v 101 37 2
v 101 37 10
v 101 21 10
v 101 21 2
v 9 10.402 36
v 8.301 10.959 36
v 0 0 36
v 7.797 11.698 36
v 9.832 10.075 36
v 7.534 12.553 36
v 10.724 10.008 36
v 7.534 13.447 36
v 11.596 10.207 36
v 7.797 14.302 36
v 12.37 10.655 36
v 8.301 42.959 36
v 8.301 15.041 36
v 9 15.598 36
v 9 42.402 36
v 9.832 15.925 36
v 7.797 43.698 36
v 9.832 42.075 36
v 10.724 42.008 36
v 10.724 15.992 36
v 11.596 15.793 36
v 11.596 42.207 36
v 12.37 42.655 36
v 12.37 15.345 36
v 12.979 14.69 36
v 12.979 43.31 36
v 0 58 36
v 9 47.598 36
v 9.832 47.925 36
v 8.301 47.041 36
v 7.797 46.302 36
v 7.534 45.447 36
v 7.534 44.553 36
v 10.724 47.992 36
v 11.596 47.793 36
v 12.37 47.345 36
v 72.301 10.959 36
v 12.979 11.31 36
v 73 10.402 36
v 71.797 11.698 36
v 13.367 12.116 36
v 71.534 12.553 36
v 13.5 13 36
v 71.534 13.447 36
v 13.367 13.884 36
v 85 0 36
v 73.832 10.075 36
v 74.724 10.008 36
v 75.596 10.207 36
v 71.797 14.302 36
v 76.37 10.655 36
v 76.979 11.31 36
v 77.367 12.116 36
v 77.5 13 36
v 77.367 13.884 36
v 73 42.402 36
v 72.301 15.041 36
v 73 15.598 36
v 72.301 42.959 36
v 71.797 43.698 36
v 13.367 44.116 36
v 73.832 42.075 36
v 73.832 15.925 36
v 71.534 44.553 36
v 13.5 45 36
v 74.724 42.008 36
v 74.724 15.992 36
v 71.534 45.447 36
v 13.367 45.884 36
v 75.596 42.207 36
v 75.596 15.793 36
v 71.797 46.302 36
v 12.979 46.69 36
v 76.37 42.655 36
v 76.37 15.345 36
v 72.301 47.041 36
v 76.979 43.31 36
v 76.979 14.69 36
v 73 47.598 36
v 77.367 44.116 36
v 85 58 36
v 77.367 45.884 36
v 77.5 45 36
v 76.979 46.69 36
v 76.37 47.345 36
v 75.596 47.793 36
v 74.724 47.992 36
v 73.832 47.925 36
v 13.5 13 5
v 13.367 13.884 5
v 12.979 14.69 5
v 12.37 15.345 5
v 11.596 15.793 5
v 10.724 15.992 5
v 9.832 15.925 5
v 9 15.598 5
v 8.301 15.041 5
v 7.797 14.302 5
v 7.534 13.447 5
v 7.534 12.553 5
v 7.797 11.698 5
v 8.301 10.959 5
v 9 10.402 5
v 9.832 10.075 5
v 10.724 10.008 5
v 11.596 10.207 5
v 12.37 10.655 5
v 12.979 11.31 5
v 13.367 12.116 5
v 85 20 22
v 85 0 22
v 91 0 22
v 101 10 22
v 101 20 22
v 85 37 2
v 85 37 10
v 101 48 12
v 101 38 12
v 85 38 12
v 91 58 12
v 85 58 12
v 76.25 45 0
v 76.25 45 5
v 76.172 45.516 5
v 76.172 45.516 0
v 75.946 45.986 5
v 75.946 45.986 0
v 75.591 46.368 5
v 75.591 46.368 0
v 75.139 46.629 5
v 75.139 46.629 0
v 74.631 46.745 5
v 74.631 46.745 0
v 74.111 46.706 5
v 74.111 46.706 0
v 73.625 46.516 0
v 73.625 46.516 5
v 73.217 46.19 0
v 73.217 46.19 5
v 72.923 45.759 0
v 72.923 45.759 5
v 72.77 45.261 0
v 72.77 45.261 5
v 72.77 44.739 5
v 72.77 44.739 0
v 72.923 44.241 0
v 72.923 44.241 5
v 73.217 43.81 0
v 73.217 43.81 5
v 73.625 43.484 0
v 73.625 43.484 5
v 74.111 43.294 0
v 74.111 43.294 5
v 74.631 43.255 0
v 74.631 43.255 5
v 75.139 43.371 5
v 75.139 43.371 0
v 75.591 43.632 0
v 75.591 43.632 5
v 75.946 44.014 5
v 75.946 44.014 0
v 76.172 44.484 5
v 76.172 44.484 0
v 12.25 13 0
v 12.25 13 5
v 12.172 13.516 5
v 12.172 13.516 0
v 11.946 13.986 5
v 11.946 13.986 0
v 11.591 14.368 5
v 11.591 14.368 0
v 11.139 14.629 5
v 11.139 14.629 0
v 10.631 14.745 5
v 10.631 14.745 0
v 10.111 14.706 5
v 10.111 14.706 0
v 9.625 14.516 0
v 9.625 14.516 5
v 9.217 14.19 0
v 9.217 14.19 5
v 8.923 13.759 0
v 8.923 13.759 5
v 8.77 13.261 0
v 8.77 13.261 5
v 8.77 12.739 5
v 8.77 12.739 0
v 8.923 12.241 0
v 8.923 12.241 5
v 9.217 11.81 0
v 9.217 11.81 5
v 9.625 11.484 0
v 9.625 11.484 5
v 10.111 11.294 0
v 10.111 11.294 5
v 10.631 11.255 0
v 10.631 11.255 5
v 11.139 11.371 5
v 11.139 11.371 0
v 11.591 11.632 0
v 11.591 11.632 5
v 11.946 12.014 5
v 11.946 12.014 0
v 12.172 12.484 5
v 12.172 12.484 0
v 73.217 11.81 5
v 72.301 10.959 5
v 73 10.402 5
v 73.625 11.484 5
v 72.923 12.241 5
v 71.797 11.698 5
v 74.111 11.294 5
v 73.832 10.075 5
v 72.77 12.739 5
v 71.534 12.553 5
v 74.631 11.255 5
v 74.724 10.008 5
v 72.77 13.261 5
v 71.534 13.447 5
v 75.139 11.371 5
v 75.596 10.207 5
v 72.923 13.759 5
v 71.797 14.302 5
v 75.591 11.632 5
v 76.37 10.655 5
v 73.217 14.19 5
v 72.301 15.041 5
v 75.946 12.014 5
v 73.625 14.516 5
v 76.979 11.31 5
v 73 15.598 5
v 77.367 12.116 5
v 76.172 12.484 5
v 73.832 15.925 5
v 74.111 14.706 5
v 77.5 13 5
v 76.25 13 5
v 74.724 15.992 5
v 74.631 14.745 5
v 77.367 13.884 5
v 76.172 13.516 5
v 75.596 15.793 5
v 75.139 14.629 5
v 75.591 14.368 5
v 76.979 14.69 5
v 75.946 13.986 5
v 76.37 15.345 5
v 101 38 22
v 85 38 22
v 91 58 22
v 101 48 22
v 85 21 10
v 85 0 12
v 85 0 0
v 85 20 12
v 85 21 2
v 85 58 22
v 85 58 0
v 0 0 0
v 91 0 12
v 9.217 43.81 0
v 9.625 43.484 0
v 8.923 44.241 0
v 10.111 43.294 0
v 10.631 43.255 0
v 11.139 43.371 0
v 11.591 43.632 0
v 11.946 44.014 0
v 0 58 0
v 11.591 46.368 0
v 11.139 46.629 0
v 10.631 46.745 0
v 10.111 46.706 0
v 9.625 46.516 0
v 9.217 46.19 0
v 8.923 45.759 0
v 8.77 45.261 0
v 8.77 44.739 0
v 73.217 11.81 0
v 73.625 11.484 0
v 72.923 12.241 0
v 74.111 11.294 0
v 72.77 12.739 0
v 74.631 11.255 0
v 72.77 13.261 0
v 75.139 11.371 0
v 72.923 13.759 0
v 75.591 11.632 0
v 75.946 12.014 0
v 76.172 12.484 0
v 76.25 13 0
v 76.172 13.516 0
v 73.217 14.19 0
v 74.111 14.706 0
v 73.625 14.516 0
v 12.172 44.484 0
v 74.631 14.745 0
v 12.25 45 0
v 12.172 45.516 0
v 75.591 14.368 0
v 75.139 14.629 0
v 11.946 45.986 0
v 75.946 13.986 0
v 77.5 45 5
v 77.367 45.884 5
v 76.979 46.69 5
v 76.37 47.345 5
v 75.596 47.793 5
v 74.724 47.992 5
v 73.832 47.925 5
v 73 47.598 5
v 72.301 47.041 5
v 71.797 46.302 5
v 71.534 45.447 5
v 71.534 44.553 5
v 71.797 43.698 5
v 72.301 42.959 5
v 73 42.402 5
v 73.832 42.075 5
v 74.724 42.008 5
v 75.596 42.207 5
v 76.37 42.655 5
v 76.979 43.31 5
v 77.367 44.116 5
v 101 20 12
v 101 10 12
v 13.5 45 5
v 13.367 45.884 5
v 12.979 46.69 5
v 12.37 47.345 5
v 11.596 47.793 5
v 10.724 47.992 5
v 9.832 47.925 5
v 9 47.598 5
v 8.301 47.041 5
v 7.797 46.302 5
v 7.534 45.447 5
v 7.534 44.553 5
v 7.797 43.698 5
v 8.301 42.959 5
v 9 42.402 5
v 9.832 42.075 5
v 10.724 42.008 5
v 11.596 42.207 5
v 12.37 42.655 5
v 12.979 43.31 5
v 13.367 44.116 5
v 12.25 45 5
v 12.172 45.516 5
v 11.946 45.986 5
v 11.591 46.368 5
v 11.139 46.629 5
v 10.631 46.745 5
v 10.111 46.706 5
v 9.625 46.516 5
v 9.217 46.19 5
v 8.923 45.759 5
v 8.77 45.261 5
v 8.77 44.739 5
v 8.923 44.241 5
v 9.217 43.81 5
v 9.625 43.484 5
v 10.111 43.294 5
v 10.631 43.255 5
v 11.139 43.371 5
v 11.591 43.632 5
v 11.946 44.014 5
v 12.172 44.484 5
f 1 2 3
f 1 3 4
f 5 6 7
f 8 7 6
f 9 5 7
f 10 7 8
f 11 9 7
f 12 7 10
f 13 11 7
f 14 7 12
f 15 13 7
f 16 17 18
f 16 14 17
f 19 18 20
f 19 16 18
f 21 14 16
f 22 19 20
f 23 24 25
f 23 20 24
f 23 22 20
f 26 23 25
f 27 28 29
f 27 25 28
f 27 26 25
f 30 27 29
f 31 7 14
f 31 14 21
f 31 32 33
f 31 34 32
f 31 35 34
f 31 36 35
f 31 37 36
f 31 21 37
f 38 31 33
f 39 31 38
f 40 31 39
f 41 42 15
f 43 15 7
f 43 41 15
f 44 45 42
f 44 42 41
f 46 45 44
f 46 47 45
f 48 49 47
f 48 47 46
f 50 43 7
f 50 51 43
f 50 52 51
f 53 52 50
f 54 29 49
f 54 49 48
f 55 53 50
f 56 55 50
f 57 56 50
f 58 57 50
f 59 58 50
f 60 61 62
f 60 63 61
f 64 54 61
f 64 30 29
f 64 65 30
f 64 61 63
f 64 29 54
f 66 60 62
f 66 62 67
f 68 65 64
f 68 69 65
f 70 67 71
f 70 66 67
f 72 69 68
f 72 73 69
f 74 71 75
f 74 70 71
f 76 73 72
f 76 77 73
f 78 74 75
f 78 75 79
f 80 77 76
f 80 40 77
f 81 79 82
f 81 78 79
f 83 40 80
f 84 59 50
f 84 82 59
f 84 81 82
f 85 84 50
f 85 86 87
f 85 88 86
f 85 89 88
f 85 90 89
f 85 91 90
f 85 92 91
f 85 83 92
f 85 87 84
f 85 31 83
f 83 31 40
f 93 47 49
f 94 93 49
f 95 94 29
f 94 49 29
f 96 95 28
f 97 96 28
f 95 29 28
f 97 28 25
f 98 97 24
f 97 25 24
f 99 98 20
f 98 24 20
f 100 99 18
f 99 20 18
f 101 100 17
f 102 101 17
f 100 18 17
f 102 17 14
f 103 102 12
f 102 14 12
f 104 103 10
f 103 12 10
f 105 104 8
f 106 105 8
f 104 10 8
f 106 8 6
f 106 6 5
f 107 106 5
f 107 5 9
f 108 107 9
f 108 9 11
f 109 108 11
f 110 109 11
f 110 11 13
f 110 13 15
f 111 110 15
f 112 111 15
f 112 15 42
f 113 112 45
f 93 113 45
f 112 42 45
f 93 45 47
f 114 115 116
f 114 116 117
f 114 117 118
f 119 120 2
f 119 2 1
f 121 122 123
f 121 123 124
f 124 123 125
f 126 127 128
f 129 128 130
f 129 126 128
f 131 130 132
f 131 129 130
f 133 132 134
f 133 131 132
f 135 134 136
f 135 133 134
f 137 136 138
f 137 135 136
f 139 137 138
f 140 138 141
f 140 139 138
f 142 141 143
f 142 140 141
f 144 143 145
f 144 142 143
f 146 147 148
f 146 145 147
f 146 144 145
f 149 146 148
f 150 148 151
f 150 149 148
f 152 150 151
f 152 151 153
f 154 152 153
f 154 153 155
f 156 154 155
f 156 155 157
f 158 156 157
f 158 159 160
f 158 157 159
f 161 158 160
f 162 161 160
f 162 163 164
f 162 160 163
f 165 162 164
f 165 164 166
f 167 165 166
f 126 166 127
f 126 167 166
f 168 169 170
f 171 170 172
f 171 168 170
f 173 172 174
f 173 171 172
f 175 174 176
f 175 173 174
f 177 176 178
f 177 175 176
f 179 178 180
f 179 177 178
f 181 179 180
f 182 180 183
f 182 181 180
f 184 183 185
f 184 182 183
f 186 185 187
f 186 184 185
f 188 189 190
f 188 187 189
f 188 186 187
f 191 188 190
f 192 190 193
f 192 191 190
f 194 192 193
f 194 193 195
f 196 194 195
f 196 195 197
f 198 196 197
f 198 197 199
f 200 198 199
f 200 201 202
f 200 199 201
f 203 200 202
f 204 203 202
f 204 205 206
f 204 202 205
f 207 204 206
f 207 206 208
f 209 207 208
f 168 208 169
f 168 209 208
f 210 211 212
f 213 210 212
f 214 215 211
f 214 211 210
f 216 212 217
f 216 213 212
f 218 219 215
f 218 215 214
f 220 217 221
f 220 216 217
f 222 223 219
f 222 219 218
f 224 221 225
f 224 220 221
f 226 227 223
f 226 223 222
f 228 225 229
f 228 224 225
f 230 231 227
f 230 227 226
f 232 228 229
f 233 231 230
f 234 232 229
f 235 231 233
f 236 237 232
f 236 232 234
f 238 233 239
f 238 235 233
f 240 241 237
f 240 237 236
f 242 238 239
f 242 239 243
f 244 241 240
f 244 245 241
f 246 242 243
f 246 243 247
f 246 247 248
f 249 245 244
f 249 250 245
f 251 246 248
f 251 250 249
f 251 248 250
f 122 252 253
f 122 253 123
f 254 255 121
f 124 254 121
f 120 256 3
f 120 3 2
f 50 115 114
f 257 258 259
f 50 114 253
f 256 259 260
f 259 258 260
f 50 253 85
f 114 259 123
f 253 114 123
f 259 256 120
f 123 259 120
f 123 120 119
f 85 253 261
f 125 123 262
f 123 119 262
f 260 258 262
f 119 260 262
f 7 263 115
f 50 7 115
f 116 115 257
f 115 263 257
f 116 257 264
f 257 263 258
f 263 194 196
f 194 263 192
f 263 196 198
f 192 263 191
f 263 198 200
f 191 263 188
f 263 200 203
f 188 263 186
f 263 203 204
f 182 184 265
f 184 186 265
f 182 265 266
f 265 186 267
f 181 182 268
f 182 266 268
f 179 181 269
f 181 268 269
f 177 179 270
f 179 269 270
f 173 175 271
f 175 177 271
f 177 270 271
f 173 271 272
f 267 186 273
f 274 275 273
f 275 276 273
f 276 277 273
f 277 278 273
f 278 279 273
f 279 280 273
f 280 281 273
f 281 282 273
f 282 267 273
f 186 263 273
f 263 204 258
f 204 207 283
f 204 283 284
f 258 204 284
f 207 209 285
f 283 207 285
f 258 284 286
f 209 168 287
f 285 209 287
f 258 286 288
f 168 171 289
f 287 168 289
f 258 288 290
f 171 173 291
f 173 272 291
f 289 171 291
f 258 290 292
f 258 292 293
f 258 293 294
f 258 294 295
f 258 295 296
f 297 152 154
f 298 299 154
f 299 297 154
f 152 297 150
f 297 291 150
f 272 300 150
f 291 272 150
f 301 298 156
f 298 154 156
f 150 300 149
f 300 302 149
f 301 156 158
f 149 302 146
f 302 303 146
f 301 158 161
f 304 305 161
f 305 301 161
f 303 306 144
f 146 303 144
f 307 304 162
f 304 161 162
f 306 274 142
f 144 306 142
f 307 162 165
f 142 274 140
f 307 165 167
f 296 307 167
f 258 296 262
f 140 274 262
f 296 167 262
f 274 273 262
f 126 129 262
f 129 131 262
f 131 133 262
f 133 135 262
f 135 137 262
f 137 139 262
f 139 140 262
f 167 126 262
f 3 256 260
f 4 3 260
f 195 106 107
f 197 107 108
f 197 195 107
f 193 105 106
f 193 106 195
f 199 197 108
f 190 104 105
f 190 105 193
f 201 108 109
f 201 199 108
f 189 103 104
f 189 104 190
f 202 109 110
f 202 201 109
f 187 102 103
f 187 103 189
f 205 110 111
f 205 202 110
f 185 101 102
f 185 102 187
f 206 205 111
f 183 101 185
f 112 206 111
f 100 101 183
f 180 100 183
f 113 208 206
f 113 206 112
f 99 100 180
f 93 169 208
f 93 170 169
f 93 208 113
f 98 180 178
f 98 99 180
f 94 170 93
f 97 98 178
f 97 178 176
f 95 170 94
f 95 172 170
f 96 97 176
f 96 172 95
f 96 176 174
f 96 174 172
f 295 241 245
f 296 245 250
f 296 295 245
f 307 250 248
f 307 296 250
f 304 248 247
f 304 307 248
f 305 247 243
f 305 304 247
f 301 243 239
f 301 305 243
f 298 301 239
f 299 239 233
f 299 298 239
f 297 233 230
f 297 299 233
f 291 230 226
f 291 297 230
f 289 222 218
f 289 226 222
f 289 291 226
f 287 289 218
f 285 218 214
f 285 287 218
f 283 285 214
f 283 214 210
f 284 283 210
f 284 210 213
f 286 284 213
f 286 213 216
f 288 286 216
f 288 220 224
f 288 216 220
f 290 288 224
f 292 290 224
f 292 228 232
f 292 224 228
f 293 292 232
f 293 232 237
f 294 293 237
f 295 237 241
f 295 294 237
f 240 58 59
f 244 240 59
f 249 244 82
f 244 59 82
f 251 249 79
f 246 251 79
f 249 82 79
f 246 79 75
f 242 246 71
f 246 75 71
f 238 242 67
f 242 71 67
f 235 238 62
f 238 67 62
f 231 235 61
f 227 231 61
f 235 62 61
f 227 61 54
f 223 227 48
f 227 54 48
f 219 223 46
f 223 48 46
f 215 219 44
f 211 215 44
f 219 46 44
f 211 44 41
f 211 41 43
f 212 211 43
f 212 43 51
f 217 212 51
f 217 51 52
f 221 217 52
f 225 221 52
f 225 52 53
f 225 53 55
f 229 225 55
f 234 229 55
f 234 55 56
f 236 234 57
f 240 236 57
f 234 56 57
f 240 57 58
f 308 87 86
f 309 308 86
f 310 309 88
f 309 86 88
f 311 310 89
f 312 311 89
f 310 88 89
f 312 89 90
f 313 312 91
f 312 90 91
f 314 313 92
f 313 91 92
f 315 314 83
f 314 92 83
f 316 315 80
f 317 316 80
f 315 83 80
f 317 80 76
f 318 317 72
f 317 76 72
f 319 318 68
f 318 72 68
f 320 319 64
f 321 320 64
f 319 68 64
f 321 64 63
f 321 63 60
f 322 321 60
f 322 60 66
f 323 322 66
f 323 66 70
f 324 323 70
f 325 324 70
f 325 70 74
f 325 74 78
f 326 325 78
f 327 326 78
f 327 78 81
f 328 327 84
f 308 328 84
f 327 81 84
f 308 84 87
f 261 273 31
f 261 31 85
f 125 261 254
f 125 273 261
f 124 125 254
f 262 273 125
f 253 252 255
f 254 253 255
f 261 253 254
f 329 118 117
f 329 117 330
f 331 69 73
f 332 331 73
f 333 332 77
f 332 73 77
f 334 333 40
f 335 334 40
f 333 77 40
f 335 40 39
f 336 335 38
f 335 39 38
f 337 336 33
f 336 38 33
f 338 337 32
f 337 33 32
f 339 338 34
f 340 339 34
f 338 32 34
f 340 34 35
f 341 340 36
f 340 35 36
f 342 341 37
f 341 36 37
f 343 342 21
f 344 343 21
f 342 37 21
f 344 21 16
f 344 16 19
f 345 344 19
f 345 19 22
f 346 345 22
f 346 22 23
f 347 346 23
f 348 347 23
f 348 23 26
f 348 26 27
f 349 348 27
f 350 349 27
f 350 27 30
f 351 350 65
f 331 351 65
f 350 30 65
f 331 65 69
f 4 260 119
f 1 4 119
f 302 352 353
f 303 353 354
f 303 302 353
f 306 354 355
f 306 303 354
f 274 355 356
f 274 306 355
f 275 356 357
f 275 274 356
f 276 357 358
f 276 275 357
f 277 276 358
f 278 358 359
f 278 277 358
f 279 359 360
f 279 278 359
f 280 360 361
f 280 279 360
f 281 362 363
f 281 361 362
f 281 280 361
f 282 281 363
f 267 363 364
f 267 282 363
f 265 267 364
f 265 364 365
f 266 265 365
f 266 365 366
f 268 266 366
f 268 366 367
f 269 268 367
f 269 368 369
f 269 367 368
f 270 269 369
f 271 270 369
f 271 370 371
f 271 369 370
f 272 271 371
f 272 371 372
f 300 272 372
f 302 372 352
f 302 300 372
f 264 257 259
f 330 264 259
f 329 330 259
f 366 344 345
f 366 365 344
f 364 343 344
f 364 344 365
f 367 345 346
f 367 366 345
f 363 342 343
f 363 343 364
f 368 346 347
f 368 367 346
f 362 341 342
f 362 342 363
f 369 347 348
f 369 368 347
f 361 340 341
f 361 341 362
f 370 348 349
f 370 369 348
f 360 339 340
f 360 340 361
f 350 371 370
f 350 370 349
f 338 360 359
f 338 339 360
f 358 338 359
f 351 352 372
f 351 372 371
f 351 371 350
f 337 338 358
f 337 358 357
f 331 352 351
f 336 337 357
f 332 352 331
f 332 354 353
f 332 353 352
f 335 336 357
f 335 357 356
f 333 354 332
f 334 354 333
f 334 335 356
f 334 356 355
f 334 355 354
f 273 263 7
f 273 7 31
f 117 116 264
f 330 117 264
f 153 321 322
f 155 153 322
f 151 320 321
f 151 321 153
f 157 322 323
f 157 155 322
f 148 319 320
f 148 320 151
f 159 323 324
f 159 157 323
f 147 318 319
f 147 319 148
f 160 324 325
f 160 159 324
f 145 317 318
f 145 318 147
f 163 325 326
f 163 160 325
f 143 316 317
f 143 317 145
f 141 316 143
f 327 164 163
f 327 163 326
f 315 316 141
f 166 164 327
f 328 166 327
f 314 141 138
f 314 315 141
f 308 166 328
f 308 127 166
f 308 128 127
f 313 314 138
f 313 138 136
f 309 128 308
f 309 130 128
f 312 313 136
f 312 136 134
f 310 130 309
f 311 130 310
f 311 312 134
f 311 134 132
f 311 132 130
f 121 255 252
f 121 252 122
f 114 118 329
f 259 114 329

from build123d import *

# Parameters (mm, degrees)
SKETCH_1_W          = 85
SKETCH_1_H          = 58
SKETCH_1_R          = 1.75
EXTRUDE_1_DEPTH     = 36
SKETCH_2_R          = 3
CUT_EXTRUDE_1_DEPTH = 31
SKETCH_5_W          = 8
SKETCH_5_H          = 16
EXTRUDE_867_DEPTH   = 16
SKETCH_6_W          = 10
SKETCH_6_H          = 20
EXTRUDE_2_DEPTH     = 16
CHAMFER_1_SIZE      = 10


with BuildPart() as part:
    # 草图1 → 凸台-拉伸1 (new body)
    with BuildSketch(Plane.XY):
        with Locations((42.5, 29)):
            Rectangle(SKETCH_1_W, SKETCH_1_H)
        with Locations((10.5, 45)):
            Circle(SKETCH_1_R, mode=Mode.SUBTRACT)
        with Locations((74.5, 45)):
            Circle(SKETCH_1_R, mode=Mode.SUBTRACT)
        with Locations((10.5, 13)):
            Circle(SKETCH_1_R, mode=Mode.SUBTRACT)
        with Locations((74.5, 13)):
            Circle(SKETCH_1_R, mode=Mode.SUBTRACT)
    extrude(amount=EXTRUDE_1_DEPTH)

    # 草图2 → 切除-拉伸1 (cut)
    with BuildSketch(Plane.XY.offset(36)):
        with Locations((10.5, 45)):
            Circle(SKETCH_2_R)
        with Locations((74.5, 45)):
            Circle(SKETCH_2_R)
        with Locations((74.5, 13)):
            Circle(SKETCH_2_R)
        with Locations((10.5, 13)):
            Circle(SKETCH_2_R)
    extrude(amount=-CUT_EXTRUDE_1_DEPTH, mode=Mode.SUBTRACT)

    # 草图5 → Extrude 867 (add)
    with BuildSketch(Plane(origin=(85, 0, 0), x_dir=(0, 0, -1), z_dir=(1, 0, 0))):
        with Locations((-6, 29)):
            Rectangle(SKETCH_5_W, SKETCH_5_H)
    extrude(amount=EXTRUDE_867_DEPTH)

    # 草图6 → 凸台-拉伸2 (add)
    with BuildSketch(Plane(origin=(85, 0, 0), x_dir=(0, 0, -1), z_dir=(1, 0, 0))):
        with Locations((-17, 48)):
            Rectangle(SKETCH_6_W, SKETCH_6_H)
        with Locations((-17, 10)):
            Rectangle(SKETCH_6_W, SKETCH_6_H)
    extrude(amount=EXTRUDE_2_DEPTH)

    # 倒角1
    chamfer_1_edges = [part.edges().sort_by_distance(p)[0] for p in [
        (101, 58, 17),
        (101, 0, 17),
    ]]
    chamfer(chamfer_1_edges, length=CHAMFER_1_SIZE)


solid = part.part
